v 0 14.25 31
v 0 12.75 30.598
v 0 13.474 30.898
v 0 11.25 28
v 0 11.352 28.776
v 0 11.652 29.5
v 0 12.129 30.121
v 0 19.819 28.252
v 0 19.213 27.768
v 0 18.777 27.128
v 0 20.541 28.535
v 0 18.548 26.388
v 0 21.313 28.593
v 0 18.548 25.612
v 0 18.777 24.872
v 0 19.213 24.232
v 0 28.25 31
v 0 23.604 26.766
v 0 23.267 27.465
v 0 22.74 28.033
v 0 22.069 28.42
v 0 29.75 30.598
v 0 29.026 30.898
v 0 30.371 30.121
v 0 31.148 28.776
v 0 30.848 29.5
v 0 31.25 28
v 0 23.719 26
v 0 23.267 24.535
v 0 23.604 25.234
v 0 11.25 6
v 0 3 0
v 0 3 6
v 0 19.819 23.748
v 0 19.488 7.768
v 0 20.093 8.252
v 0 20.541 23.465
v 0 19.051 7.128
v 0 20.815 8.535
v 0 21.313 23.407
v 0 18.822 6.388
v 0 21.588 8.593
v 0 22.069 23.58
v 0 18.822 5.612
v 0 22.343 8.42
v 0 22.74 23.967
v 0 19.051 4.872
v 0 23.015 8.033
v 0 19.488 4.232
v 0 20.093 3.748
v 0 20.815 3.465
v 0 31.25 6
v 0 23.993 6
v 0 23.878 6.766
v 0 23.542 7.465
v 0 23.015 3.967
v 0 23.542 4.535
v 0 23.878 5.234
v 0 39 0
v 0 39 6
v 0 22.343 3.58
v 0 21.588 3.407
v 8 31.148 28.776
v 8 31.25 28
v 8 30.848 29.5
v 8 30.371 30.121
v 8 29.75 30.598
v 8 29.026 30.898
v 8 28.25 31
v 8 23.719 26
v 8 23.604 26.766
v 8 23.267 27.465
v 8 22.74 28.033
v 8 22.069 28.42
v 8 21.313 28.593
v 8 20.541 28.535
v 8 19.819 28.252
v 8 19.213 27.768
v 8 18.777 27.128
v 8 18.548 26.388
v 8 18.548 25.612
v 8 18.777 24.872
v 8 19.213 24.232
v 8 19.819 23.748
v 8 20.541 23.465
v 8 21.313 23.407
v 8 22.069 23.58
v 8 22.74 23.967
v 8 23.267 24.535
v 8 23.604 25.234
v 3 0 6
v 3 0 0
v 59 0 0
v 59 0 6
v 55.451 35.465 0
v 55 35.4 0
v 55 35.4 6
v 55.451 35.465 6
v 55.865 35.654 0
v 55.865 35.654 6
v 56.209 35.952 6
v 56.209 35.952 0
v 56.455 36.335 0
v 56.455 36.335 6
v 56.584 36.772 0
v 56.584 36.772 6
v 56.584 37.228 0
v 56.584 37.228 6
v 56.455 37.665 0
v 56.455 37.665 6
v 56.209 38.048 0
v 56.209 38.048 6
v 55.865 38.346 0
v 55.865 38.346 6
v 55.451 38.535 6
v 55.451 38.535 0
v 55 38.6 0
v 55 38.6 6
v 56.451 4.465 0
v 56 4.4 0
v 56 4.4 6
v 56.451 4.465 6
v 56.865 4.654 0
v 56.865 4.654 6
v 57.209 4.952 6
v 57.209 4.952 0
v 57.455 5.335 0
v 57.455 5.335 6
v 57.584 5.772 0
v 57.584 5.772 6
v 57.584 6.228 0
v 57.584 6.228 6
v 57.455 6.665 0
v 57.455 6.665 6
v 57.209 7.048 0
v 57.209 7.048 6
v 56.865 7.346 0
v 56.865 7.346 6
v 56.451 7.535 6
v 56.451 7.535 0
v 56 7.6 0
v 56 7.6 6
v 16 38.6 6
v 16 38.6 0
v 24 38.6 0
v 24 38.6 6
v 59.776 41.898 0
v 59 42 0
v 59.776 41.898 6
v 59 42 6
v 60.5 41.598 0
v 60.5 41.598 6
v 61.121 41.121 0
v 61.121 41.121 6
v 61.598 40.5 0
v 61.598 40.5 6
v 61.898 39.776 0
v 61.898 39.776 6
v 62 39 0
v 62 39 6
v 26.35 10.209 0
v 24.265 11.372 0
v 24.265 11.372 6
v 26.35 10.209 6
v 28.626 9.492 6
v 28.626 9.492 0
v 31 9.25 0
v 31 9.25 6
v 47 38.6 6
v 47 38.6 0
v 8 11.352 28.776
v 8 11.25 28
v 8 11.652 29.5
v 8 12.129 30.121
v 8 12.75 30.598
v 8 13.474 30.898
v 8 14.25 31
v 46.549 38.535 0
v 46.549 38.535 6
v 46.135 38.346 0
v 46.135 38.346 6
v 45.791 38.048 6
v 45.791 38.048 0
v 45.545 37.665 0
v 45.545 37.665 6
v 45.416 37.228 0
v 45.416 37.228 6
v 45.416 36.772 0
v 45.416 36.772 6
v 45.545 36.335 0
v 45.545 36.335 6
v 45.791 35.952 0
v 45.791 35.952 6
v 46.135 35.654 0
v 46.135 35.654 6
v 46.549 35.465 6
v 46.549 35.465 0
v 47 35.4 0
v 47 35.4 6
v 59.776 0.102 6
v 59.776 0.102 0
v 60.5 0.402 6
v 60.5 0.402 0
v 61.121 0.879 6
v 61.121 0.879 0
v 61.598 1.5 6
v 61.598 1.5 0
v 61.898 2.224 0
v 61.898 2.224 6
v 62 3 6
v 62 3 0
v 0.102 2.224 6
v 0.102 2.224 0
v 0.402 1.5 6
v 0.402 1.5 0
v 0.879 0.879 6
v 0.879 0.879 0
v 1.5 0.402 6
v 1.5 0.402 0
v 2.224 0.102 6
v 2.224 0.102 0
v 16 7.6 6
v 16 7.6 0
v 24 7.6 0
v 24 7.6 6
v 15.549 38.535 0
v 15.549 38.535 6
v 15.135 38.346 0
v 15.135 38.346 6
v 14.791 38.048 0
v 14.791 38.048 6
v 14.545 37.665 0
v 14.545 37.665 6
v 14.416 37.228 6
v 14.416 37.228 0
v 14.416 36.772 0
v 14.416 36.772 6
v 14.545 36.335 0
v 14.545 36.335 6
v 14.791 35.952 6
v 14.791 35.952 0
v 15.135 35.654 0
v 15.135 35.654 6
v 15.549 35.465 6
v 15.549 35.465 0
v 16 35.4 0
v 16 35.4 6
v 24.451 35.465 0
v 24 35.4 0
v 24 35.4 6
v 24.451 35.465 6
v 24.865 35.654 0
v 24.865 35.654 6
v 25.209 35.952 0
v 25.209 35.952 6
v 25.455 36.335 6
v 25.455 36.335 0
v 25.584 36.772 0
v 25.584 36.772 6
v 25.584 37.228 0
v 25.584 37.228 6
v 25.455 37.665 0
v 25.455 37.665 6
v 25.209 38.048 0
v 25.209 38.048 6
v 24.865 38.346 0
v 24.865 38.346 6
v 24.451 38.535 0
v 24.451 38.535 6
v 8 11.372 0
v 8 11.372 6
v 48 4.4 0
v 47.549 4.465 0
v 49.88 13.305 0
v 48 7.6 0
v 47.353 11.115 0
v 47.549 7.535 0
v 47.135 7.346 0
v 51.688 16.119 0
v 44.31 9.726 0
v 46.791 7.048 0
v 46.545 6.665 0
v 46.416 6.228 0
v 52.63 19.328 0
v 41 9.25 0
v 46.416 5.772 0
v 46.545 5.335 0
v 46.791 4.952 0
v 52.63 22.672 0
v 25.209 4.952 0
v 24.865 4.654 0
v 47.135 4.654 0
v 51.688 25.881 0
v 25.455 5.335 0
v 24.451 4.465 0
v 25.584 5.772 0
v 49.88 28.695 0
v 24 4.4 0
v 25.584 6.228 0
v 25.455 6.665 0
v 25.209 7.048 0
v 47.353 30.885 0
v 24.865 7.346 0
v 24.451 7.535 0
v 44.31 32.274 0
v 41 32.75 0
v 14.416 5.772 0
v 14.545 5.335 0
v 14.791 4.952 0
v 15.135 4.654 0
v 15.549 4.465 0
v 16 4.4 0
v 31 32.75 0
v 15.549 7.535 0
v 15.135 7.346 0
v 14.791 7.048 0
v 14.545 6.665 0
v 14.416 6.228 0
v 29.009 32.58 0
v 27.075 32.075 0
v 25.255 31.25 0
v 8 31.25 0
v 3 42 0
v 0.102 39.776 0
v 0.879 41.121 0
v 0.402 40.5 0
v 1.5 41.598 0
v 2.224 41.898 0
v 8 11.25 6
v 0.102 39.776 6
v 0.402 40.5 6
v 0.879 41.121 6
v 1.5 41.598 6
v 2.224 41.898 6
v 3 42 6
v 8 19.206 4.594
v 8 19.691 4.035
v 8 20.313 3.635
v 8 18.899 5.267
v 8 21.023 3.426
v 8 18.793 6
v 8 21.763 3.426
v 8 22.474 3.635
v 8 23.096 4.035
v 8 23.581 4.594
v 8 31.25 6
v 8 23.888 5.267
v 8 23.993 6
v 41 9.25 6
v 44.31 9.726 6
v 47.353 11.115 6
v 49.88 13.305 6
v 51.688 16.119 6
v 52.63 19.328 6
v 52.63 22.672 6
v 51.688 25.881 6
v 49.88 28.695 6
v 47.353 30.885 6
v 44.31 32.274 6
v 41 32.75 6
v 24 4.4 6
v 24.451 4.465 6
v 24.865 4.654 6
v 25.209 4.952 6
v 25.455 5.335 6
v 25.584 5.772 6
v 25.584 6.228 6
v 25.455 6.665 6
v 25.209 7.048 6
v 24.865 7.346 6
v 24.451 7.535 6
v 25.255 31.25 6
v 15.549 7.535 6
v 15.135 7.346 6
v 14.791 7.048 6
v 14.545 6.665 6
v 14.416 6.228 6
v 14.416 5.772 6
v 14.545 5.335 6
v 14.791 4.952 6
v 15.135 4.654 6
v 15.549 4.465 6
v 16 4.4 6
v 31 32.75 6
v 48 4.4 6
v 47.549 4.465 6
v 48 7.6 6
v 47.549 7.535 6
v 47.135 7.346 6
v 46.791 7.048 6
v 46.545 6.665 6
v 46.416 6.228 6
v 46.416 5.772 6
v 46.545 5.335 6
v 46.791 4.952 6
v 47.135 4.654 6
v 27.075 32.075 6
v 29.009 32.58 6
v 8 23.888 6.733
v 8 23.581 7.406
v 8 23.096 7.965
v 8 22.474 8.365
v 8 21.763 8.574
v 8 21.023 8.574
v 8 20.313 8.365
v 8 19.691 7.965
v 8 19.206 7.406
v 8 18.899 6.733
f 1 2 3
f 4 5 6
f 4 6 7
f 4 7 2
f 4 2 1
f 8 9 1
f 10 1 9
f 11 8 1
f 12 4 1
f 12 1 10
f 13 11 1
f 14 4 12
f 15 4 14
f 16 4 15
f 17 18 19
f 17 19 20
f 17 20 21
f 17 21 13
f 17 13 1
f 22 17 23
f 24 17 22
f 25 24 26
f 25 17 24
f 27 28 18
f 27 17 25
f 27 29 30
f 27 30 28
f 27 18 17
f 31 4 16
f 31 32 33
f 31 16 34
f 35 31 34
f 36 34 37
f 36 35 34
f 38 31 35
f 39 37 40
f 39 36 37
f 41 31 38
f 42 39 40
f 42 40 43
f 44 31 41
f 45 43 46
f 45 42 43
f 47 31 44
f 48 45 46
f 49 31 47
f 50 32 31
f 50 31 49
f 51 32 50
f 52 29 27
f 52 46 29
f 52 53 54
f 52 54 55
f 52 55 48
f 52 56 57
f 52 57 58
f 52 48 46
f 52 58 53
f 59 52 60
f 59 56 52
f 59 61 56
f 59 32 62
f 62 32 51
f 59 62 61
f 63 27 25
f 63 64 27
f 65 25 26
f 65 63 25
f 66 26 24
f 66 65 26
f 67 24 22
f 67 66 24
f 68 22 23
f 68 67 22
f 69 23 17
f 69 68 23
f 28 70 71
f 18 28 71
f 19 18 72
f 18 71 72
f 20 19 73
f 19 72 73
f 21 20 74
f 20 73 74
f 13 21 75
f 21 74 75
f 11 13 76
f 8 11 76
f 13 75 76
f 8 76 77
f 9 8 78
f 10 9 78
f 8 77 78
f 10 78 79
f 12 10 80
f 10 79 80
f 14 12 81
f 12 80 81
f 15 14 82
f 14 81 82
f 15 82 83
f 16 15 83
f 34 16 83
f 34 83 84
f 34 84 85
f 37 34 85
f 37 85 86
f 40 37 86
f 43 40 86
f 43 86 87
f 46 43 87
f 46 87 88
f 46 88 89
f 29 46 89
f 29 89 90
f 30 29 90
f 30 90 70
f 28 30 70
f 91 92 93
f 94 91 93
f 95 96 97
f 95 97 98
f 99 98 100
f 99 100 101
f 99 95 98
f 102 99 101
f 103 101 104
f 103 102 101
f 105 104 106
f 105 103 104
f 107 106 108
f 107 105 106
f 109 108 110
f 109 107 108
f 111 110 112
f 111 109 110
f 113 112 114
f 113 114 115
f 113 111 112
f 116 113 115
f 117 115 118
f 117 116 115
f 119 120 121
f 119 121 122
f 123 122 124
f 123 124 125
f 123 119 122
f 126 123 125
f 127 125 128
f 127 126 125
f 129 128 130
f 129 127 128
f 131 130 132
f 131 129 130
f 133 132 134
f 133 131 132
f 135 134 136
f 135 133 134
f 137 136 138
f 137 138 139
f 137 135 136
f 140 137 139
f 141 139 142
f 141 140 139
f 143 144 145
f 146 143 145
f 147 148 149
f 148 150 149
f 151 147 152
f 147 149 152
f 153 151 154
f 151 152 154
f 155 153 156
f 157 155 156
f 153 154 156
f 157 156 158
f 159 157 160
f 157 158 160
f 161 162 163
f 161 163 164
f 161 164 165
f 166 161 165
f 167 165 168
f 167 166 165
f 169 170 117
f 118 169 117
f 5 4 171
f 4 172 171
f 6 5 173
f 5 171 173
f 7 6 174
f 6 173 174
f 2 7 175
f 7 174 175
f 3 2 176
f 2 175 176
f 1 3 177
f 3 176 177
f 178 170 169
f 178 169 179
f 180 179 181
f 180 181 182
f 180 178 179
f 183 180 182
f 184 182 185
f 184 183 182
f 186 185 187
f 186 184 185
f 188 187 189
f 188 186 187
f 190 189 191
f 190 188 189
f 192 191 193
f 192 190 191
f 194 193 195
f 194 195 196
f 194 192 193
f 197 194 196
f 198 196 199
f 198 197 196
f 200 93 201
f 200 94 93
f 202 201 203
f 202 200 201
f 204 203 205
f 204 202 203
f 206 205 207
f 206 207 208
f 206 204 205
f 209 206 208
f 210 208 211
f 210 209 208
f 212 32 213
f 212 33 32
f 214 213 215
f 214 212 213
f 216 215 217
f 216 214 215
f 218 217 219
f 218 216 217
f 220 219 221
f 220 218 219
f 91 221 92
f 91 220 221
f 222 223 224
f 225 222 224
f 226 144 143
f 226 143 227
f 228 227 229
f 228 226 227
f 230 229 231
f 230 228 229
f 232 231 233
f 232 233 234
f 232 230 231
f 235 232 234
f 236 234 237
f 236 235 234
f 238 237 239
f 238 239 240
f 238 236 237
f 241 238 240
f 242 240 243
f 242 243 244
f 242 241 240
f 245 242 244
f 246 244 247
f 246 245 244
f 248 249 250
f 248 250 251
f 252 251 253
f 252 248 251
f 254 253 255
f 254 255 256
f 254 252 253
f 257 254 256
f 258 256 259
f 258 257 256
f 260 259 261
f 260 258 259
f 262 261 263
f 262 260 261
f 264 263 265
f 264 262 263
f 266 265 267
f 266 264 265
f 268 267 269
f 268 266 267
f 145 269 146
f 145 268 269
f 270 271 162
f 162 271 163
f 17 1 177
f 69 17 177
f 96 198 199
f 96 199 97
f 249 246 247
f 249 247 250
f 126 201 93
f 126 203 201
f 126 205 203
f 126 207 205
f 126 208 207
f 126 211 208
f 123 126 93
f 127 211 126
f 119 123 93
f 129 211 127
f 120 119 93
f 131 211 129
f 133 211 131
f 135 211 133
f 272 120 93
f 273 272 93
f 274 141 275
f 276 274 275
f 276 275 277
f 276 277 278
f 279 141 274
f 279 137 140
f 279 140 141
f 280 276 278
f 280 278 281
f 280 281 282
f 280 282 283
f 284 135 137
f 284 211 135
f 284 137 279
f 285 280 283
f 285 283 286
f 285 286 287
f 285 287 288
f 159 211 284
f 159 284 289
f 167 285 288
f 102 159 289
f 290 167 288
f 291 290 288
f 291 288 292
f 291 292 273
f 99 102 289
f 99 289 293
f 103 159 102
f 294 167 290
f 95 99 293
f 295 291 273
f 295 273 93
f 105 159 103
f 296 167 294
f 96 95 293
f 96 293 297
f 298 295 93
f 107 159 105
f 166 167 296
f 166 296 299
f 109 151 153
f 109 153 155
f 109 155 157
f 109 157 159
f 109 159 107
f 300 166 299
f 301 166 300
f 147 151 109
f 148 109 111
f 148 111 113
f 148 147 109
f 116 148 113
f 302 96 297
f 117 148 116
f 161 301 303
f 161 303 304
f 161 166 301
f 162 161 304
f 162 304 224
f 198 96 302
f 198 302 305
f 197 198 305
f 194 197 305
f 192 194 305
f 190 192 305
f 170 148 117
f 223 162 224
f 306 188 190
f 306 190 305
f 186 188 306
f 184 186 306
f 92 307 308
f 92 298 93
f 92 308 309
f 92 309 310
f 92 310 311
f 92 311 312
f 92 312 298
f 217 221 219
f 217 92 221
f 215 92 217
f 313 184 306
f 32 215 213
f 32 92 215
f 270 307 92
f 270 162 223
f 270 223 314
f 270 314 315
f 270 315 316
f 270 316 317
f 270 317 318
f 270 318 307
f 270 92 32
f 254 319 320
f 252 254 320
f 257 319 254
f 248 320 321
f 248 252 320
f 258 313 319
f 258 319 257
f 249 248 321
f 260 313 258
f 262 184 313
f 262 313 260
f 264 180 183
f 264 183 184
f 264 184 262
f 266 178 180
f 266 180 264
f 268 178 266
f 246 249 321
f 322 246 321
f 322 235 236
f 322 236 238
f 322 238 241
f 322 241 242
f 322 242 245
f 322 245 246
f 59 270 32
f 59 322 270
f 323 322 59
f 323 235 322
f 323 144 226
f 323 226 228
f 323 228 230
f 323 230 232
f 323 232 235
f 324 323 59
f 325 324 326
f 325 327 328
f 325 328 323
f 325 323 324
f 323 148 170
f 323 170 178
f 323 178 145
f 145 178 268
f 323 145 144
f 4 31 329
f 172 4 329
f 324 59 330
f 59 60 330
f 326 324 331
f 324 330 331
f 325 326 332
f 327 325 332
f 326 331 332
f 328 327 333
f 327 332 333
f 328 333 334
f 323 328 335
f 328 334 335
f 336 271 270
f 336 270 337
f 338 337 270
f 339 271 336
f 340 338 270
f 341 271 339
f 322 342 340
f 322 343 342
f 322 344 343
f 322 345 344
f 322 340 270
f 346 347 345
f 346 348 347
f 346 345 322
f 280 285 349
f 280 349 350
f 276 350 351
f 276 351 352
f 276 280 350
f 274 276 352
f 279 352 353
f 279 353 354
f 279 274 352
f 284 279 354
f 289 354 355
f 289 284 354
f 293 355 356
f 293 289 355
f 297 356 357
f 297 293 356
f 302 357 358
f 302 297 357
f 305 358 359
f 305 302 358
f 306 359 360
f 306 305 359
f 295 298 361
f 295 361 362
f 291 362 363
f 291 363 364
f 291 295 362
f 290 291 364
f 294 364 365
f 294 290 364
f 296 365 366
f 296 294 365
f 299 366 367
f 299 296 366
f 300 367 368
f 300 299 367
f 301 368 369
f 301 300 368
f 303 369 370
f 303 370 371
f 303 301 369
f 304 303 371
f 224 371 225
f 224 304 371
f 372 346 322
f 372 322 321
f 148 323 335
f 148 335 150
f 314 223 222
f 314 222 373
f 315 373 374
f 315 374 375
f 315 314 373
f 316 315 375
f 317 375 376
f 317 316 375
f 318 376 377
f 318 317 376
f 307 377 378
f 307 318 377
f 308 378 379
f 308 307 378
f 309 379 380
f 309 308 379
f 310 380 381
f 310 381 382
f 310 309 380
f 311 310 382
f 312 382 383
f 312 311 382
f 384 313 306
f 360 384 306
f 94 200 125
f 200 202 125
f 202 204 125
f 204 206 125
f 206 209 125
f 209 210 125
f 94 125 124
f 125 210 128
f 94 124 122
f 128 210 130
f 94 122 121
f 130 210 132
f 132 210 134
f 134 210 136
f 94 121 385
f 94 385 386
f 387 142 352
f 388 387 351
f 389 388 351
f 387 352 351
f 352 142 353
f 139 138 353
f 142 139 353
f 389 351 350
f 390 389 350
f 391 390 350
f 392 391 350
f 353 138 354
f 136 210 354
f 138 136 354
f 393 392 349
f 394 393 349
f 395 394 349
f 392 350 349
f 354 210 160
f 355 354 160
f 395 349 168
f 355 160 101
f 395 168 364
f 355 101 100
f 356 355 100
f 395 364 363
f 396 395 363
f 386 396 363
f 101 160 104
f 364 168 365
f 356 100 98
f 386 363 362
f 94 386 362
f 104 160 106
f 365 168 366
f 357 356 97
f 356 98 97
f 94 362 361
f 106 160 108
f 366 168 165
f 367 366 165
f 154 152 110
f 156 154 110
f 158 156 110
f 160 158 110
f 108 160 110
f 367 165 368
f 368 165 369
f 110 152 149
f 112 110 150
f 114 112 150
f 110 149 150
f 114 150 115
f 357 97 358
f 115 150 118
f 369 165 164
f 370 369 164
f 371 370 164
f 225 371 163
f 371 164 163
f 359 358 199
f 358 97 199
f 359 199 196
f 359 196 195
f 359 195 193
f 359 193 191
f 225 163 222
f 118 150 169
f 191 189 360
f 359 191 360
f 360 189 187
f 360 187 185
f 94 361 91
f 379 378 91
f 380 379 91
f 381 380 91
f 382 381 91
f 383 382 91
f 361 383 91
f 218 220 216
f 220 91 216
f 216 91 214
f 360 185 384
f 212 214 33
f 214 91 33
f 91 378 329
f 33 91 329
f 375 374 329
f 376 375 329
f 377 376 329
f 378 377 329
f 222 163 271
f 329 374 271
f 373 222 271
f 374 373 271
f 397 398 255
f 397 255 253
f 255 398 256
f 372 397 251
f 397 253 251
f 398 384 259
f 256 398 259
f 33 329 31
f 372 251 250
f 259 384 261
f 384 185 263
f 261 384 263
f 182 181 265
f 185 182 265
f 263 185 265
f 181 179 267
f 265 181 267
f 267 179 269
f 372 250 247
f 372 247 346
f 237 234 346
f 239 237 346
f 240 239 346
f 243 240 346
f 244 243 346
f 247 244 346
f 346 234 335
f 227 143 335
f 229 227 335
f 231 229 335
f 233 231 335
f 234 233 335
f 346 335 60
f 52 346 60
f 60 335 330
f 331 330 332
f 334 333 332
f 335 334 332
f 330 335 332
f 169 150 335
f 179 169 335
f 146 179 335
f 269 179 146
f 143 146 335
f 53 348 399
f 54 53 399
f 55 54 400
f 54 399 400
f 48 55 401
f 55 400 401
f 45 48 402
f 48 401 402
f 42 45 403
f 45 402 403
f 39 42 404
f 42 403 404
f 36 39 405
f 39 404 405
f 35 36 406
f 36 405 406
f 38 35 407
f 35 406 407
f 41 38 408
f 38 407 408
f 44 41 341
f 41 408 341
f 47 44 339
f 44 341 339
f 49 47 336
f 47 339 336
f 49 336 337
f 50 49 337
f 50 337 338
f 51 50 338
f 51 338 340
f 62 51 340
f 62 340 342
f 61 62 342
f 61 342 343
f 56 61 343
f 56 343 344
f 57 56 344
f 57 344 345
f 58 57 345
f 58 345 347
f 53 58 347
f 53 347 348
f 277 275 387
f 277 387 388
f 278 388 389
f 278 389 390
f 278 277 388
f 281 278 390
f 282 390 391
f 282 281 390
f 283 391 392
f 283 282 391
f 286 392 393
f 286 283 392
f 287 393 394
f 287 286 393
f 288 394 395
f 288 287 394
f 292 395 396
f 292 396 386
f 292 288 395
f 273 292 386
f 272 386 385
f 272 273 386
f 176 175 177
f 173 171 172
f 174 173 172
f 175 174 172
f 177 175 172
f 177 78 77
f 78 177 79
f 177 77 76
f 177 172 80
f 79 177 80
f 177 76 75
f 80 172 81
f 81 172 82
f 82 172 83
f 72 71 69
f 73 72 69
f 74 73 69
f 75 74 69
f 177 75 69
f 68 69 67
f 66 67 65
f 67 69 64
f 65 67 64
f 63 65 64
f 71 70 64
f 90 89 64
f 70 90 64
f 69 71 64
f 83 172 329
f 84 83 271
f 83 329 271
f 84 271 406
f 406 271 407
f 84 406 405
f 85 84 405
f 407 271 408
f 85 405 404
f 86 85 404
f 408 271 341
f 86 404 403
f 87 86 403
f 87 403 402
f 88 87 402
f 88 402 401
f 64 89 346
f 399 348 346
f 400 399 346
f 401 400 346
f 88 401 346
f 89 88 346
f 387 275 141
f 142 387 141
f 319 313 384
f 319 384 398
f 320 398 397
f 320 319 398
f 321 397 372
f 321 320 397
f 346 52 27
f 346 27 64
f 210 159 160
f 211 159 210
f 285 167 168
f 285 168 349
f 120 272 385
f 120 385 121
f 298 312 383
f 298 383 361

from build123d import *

# Parameters (mm, degrees)
PAD_DEPTH         = 6
SKETCH001_W       = 8
SKETCH001_H       = 20
PAD001_DEPTH      = 25
PAD001_DEPTH_BACK = 4
SKETCH002_W       = 17.981461
SKETCH002_H       = 19.878344
POCKET_DEPTH      = 6
SKETCH003_R       = 2.6
POCKET001_DEPTH   = 9
FILLET_R          = 3


with BuildPart() as part:
    # Sketch → Pad (new body)
    with BuildSketch(Plane.XY):
        Polygon((62, 42), (62, 0), (10, 0), (0, 0), (0, 42), align=None)
        with BuildLine():
            ThreePointArc((16, 38.6), (14.4, 37), (16, 35.4))
            Line((16, 35.4), (24, 35.4))
            ThreePointArc((24, 35.4), (25.6, 37), (24, 38.6))
            Line((16, 38.6), (24, 38.6))
        make_face(mode=Mode.SUBTRACT)
        with BuildLine():
            Line((47, 38.6), (55, 38.6))
            ThreePointArc((55, 35.4), (56.6, 37), (55, 38.6))
            Line((47, 35.4), (55, 35.4))
            ThreePointArc((47, 38.6), (45.4, 37), (47, 35.4))
        make_face(mode=Mode.SUBTRACT)
        with BuildLine():
            ThreePointArc((16, 7.6), (14.4, 6), (16, 4.4))
            Line((16, 4.4), (24, 4.4))
            ThreePointArc((24, 4.4), (25.6, 6), (24, 7.6))
            Line((16, 7.6), (24, 7.6))
        make_face(mode=Mode.SUBTRACT)
        with BuildLine():
            ThreePointArc((48, 7.6), (46.4, 6), (48, 4.4))
            Line((48, 4.4), (56, 4.4))
            ThreePointArc((56, 4.4), (57.6, 6), (56, 7.6))
            Line((48, 7.6), (56, 7.6))
        make_face(mode=Mode.SUBTRACT)
        with BuildLine():
            ThreePointArc((31, 32.75), (19.25, 21), (31, 9.25))
            Line((31, 9.25), (41, 9.25))
            ThreePointArc((41, 9.25), (52.75, 21), (41, 32.75))
            Line((31, 32.75), (41, 32.75))
        make_face(mode=Mode.SUBTRACT)
    extrude(amount=PAD_DEPTH)

    # Sketch001 (on Face27 of Pad) → Pad001 (join, two sides)
    with BuildSketch(Plane.XY.offset(6)) as pad001_sk:
        with Locations((4, 21.25)):
            Rectangle(SKETCH001_W, SKETCH001_H)
    extrude(amount=PAD001_DEPTH)
    extrude(pad001_sk.sketch, amount=-PAD001_DEPTH_BACK)

    # Sketch002 (on Face5 of Pad001) → Pocket (cut)
    with BuildSketch(Plane.XY.offset(6)):
        with Locations((16.99073, 21.310828)):
            Rectangle(SKETCH002_W, SKETCH002_H)
    extrude(amount=-POCKET_DEPTH, mode=Mode.SUBTRACT)

    # Sketch003 (on Face34 of Pocket) → Pocket001 (cut)
    with BuildSketch(Plane.YZ.offset(8)):
        with Locations((21.119102, 26)):
            Circle(SKETCH003_R)
        with Locations((21.393444, 6)):
            Circle(SKETCH003_R)
    extrude(amount=-POCKET001_DEPTH, mode=Mode.SUBTRACT)

    # Fillet
    fillet_edges = [part.edges().sort_by_distance(p)[0] for p in [
        (0, 0, 3),
        (62, 0, 3),
        (62, 42, 3),
        (0, 42, 3),
        (4, 31.25, 31),
        (4, 11.25, 31),
    ]]
    fillet(fillet_edges, radius=FILLET_R)


solid = part.part
